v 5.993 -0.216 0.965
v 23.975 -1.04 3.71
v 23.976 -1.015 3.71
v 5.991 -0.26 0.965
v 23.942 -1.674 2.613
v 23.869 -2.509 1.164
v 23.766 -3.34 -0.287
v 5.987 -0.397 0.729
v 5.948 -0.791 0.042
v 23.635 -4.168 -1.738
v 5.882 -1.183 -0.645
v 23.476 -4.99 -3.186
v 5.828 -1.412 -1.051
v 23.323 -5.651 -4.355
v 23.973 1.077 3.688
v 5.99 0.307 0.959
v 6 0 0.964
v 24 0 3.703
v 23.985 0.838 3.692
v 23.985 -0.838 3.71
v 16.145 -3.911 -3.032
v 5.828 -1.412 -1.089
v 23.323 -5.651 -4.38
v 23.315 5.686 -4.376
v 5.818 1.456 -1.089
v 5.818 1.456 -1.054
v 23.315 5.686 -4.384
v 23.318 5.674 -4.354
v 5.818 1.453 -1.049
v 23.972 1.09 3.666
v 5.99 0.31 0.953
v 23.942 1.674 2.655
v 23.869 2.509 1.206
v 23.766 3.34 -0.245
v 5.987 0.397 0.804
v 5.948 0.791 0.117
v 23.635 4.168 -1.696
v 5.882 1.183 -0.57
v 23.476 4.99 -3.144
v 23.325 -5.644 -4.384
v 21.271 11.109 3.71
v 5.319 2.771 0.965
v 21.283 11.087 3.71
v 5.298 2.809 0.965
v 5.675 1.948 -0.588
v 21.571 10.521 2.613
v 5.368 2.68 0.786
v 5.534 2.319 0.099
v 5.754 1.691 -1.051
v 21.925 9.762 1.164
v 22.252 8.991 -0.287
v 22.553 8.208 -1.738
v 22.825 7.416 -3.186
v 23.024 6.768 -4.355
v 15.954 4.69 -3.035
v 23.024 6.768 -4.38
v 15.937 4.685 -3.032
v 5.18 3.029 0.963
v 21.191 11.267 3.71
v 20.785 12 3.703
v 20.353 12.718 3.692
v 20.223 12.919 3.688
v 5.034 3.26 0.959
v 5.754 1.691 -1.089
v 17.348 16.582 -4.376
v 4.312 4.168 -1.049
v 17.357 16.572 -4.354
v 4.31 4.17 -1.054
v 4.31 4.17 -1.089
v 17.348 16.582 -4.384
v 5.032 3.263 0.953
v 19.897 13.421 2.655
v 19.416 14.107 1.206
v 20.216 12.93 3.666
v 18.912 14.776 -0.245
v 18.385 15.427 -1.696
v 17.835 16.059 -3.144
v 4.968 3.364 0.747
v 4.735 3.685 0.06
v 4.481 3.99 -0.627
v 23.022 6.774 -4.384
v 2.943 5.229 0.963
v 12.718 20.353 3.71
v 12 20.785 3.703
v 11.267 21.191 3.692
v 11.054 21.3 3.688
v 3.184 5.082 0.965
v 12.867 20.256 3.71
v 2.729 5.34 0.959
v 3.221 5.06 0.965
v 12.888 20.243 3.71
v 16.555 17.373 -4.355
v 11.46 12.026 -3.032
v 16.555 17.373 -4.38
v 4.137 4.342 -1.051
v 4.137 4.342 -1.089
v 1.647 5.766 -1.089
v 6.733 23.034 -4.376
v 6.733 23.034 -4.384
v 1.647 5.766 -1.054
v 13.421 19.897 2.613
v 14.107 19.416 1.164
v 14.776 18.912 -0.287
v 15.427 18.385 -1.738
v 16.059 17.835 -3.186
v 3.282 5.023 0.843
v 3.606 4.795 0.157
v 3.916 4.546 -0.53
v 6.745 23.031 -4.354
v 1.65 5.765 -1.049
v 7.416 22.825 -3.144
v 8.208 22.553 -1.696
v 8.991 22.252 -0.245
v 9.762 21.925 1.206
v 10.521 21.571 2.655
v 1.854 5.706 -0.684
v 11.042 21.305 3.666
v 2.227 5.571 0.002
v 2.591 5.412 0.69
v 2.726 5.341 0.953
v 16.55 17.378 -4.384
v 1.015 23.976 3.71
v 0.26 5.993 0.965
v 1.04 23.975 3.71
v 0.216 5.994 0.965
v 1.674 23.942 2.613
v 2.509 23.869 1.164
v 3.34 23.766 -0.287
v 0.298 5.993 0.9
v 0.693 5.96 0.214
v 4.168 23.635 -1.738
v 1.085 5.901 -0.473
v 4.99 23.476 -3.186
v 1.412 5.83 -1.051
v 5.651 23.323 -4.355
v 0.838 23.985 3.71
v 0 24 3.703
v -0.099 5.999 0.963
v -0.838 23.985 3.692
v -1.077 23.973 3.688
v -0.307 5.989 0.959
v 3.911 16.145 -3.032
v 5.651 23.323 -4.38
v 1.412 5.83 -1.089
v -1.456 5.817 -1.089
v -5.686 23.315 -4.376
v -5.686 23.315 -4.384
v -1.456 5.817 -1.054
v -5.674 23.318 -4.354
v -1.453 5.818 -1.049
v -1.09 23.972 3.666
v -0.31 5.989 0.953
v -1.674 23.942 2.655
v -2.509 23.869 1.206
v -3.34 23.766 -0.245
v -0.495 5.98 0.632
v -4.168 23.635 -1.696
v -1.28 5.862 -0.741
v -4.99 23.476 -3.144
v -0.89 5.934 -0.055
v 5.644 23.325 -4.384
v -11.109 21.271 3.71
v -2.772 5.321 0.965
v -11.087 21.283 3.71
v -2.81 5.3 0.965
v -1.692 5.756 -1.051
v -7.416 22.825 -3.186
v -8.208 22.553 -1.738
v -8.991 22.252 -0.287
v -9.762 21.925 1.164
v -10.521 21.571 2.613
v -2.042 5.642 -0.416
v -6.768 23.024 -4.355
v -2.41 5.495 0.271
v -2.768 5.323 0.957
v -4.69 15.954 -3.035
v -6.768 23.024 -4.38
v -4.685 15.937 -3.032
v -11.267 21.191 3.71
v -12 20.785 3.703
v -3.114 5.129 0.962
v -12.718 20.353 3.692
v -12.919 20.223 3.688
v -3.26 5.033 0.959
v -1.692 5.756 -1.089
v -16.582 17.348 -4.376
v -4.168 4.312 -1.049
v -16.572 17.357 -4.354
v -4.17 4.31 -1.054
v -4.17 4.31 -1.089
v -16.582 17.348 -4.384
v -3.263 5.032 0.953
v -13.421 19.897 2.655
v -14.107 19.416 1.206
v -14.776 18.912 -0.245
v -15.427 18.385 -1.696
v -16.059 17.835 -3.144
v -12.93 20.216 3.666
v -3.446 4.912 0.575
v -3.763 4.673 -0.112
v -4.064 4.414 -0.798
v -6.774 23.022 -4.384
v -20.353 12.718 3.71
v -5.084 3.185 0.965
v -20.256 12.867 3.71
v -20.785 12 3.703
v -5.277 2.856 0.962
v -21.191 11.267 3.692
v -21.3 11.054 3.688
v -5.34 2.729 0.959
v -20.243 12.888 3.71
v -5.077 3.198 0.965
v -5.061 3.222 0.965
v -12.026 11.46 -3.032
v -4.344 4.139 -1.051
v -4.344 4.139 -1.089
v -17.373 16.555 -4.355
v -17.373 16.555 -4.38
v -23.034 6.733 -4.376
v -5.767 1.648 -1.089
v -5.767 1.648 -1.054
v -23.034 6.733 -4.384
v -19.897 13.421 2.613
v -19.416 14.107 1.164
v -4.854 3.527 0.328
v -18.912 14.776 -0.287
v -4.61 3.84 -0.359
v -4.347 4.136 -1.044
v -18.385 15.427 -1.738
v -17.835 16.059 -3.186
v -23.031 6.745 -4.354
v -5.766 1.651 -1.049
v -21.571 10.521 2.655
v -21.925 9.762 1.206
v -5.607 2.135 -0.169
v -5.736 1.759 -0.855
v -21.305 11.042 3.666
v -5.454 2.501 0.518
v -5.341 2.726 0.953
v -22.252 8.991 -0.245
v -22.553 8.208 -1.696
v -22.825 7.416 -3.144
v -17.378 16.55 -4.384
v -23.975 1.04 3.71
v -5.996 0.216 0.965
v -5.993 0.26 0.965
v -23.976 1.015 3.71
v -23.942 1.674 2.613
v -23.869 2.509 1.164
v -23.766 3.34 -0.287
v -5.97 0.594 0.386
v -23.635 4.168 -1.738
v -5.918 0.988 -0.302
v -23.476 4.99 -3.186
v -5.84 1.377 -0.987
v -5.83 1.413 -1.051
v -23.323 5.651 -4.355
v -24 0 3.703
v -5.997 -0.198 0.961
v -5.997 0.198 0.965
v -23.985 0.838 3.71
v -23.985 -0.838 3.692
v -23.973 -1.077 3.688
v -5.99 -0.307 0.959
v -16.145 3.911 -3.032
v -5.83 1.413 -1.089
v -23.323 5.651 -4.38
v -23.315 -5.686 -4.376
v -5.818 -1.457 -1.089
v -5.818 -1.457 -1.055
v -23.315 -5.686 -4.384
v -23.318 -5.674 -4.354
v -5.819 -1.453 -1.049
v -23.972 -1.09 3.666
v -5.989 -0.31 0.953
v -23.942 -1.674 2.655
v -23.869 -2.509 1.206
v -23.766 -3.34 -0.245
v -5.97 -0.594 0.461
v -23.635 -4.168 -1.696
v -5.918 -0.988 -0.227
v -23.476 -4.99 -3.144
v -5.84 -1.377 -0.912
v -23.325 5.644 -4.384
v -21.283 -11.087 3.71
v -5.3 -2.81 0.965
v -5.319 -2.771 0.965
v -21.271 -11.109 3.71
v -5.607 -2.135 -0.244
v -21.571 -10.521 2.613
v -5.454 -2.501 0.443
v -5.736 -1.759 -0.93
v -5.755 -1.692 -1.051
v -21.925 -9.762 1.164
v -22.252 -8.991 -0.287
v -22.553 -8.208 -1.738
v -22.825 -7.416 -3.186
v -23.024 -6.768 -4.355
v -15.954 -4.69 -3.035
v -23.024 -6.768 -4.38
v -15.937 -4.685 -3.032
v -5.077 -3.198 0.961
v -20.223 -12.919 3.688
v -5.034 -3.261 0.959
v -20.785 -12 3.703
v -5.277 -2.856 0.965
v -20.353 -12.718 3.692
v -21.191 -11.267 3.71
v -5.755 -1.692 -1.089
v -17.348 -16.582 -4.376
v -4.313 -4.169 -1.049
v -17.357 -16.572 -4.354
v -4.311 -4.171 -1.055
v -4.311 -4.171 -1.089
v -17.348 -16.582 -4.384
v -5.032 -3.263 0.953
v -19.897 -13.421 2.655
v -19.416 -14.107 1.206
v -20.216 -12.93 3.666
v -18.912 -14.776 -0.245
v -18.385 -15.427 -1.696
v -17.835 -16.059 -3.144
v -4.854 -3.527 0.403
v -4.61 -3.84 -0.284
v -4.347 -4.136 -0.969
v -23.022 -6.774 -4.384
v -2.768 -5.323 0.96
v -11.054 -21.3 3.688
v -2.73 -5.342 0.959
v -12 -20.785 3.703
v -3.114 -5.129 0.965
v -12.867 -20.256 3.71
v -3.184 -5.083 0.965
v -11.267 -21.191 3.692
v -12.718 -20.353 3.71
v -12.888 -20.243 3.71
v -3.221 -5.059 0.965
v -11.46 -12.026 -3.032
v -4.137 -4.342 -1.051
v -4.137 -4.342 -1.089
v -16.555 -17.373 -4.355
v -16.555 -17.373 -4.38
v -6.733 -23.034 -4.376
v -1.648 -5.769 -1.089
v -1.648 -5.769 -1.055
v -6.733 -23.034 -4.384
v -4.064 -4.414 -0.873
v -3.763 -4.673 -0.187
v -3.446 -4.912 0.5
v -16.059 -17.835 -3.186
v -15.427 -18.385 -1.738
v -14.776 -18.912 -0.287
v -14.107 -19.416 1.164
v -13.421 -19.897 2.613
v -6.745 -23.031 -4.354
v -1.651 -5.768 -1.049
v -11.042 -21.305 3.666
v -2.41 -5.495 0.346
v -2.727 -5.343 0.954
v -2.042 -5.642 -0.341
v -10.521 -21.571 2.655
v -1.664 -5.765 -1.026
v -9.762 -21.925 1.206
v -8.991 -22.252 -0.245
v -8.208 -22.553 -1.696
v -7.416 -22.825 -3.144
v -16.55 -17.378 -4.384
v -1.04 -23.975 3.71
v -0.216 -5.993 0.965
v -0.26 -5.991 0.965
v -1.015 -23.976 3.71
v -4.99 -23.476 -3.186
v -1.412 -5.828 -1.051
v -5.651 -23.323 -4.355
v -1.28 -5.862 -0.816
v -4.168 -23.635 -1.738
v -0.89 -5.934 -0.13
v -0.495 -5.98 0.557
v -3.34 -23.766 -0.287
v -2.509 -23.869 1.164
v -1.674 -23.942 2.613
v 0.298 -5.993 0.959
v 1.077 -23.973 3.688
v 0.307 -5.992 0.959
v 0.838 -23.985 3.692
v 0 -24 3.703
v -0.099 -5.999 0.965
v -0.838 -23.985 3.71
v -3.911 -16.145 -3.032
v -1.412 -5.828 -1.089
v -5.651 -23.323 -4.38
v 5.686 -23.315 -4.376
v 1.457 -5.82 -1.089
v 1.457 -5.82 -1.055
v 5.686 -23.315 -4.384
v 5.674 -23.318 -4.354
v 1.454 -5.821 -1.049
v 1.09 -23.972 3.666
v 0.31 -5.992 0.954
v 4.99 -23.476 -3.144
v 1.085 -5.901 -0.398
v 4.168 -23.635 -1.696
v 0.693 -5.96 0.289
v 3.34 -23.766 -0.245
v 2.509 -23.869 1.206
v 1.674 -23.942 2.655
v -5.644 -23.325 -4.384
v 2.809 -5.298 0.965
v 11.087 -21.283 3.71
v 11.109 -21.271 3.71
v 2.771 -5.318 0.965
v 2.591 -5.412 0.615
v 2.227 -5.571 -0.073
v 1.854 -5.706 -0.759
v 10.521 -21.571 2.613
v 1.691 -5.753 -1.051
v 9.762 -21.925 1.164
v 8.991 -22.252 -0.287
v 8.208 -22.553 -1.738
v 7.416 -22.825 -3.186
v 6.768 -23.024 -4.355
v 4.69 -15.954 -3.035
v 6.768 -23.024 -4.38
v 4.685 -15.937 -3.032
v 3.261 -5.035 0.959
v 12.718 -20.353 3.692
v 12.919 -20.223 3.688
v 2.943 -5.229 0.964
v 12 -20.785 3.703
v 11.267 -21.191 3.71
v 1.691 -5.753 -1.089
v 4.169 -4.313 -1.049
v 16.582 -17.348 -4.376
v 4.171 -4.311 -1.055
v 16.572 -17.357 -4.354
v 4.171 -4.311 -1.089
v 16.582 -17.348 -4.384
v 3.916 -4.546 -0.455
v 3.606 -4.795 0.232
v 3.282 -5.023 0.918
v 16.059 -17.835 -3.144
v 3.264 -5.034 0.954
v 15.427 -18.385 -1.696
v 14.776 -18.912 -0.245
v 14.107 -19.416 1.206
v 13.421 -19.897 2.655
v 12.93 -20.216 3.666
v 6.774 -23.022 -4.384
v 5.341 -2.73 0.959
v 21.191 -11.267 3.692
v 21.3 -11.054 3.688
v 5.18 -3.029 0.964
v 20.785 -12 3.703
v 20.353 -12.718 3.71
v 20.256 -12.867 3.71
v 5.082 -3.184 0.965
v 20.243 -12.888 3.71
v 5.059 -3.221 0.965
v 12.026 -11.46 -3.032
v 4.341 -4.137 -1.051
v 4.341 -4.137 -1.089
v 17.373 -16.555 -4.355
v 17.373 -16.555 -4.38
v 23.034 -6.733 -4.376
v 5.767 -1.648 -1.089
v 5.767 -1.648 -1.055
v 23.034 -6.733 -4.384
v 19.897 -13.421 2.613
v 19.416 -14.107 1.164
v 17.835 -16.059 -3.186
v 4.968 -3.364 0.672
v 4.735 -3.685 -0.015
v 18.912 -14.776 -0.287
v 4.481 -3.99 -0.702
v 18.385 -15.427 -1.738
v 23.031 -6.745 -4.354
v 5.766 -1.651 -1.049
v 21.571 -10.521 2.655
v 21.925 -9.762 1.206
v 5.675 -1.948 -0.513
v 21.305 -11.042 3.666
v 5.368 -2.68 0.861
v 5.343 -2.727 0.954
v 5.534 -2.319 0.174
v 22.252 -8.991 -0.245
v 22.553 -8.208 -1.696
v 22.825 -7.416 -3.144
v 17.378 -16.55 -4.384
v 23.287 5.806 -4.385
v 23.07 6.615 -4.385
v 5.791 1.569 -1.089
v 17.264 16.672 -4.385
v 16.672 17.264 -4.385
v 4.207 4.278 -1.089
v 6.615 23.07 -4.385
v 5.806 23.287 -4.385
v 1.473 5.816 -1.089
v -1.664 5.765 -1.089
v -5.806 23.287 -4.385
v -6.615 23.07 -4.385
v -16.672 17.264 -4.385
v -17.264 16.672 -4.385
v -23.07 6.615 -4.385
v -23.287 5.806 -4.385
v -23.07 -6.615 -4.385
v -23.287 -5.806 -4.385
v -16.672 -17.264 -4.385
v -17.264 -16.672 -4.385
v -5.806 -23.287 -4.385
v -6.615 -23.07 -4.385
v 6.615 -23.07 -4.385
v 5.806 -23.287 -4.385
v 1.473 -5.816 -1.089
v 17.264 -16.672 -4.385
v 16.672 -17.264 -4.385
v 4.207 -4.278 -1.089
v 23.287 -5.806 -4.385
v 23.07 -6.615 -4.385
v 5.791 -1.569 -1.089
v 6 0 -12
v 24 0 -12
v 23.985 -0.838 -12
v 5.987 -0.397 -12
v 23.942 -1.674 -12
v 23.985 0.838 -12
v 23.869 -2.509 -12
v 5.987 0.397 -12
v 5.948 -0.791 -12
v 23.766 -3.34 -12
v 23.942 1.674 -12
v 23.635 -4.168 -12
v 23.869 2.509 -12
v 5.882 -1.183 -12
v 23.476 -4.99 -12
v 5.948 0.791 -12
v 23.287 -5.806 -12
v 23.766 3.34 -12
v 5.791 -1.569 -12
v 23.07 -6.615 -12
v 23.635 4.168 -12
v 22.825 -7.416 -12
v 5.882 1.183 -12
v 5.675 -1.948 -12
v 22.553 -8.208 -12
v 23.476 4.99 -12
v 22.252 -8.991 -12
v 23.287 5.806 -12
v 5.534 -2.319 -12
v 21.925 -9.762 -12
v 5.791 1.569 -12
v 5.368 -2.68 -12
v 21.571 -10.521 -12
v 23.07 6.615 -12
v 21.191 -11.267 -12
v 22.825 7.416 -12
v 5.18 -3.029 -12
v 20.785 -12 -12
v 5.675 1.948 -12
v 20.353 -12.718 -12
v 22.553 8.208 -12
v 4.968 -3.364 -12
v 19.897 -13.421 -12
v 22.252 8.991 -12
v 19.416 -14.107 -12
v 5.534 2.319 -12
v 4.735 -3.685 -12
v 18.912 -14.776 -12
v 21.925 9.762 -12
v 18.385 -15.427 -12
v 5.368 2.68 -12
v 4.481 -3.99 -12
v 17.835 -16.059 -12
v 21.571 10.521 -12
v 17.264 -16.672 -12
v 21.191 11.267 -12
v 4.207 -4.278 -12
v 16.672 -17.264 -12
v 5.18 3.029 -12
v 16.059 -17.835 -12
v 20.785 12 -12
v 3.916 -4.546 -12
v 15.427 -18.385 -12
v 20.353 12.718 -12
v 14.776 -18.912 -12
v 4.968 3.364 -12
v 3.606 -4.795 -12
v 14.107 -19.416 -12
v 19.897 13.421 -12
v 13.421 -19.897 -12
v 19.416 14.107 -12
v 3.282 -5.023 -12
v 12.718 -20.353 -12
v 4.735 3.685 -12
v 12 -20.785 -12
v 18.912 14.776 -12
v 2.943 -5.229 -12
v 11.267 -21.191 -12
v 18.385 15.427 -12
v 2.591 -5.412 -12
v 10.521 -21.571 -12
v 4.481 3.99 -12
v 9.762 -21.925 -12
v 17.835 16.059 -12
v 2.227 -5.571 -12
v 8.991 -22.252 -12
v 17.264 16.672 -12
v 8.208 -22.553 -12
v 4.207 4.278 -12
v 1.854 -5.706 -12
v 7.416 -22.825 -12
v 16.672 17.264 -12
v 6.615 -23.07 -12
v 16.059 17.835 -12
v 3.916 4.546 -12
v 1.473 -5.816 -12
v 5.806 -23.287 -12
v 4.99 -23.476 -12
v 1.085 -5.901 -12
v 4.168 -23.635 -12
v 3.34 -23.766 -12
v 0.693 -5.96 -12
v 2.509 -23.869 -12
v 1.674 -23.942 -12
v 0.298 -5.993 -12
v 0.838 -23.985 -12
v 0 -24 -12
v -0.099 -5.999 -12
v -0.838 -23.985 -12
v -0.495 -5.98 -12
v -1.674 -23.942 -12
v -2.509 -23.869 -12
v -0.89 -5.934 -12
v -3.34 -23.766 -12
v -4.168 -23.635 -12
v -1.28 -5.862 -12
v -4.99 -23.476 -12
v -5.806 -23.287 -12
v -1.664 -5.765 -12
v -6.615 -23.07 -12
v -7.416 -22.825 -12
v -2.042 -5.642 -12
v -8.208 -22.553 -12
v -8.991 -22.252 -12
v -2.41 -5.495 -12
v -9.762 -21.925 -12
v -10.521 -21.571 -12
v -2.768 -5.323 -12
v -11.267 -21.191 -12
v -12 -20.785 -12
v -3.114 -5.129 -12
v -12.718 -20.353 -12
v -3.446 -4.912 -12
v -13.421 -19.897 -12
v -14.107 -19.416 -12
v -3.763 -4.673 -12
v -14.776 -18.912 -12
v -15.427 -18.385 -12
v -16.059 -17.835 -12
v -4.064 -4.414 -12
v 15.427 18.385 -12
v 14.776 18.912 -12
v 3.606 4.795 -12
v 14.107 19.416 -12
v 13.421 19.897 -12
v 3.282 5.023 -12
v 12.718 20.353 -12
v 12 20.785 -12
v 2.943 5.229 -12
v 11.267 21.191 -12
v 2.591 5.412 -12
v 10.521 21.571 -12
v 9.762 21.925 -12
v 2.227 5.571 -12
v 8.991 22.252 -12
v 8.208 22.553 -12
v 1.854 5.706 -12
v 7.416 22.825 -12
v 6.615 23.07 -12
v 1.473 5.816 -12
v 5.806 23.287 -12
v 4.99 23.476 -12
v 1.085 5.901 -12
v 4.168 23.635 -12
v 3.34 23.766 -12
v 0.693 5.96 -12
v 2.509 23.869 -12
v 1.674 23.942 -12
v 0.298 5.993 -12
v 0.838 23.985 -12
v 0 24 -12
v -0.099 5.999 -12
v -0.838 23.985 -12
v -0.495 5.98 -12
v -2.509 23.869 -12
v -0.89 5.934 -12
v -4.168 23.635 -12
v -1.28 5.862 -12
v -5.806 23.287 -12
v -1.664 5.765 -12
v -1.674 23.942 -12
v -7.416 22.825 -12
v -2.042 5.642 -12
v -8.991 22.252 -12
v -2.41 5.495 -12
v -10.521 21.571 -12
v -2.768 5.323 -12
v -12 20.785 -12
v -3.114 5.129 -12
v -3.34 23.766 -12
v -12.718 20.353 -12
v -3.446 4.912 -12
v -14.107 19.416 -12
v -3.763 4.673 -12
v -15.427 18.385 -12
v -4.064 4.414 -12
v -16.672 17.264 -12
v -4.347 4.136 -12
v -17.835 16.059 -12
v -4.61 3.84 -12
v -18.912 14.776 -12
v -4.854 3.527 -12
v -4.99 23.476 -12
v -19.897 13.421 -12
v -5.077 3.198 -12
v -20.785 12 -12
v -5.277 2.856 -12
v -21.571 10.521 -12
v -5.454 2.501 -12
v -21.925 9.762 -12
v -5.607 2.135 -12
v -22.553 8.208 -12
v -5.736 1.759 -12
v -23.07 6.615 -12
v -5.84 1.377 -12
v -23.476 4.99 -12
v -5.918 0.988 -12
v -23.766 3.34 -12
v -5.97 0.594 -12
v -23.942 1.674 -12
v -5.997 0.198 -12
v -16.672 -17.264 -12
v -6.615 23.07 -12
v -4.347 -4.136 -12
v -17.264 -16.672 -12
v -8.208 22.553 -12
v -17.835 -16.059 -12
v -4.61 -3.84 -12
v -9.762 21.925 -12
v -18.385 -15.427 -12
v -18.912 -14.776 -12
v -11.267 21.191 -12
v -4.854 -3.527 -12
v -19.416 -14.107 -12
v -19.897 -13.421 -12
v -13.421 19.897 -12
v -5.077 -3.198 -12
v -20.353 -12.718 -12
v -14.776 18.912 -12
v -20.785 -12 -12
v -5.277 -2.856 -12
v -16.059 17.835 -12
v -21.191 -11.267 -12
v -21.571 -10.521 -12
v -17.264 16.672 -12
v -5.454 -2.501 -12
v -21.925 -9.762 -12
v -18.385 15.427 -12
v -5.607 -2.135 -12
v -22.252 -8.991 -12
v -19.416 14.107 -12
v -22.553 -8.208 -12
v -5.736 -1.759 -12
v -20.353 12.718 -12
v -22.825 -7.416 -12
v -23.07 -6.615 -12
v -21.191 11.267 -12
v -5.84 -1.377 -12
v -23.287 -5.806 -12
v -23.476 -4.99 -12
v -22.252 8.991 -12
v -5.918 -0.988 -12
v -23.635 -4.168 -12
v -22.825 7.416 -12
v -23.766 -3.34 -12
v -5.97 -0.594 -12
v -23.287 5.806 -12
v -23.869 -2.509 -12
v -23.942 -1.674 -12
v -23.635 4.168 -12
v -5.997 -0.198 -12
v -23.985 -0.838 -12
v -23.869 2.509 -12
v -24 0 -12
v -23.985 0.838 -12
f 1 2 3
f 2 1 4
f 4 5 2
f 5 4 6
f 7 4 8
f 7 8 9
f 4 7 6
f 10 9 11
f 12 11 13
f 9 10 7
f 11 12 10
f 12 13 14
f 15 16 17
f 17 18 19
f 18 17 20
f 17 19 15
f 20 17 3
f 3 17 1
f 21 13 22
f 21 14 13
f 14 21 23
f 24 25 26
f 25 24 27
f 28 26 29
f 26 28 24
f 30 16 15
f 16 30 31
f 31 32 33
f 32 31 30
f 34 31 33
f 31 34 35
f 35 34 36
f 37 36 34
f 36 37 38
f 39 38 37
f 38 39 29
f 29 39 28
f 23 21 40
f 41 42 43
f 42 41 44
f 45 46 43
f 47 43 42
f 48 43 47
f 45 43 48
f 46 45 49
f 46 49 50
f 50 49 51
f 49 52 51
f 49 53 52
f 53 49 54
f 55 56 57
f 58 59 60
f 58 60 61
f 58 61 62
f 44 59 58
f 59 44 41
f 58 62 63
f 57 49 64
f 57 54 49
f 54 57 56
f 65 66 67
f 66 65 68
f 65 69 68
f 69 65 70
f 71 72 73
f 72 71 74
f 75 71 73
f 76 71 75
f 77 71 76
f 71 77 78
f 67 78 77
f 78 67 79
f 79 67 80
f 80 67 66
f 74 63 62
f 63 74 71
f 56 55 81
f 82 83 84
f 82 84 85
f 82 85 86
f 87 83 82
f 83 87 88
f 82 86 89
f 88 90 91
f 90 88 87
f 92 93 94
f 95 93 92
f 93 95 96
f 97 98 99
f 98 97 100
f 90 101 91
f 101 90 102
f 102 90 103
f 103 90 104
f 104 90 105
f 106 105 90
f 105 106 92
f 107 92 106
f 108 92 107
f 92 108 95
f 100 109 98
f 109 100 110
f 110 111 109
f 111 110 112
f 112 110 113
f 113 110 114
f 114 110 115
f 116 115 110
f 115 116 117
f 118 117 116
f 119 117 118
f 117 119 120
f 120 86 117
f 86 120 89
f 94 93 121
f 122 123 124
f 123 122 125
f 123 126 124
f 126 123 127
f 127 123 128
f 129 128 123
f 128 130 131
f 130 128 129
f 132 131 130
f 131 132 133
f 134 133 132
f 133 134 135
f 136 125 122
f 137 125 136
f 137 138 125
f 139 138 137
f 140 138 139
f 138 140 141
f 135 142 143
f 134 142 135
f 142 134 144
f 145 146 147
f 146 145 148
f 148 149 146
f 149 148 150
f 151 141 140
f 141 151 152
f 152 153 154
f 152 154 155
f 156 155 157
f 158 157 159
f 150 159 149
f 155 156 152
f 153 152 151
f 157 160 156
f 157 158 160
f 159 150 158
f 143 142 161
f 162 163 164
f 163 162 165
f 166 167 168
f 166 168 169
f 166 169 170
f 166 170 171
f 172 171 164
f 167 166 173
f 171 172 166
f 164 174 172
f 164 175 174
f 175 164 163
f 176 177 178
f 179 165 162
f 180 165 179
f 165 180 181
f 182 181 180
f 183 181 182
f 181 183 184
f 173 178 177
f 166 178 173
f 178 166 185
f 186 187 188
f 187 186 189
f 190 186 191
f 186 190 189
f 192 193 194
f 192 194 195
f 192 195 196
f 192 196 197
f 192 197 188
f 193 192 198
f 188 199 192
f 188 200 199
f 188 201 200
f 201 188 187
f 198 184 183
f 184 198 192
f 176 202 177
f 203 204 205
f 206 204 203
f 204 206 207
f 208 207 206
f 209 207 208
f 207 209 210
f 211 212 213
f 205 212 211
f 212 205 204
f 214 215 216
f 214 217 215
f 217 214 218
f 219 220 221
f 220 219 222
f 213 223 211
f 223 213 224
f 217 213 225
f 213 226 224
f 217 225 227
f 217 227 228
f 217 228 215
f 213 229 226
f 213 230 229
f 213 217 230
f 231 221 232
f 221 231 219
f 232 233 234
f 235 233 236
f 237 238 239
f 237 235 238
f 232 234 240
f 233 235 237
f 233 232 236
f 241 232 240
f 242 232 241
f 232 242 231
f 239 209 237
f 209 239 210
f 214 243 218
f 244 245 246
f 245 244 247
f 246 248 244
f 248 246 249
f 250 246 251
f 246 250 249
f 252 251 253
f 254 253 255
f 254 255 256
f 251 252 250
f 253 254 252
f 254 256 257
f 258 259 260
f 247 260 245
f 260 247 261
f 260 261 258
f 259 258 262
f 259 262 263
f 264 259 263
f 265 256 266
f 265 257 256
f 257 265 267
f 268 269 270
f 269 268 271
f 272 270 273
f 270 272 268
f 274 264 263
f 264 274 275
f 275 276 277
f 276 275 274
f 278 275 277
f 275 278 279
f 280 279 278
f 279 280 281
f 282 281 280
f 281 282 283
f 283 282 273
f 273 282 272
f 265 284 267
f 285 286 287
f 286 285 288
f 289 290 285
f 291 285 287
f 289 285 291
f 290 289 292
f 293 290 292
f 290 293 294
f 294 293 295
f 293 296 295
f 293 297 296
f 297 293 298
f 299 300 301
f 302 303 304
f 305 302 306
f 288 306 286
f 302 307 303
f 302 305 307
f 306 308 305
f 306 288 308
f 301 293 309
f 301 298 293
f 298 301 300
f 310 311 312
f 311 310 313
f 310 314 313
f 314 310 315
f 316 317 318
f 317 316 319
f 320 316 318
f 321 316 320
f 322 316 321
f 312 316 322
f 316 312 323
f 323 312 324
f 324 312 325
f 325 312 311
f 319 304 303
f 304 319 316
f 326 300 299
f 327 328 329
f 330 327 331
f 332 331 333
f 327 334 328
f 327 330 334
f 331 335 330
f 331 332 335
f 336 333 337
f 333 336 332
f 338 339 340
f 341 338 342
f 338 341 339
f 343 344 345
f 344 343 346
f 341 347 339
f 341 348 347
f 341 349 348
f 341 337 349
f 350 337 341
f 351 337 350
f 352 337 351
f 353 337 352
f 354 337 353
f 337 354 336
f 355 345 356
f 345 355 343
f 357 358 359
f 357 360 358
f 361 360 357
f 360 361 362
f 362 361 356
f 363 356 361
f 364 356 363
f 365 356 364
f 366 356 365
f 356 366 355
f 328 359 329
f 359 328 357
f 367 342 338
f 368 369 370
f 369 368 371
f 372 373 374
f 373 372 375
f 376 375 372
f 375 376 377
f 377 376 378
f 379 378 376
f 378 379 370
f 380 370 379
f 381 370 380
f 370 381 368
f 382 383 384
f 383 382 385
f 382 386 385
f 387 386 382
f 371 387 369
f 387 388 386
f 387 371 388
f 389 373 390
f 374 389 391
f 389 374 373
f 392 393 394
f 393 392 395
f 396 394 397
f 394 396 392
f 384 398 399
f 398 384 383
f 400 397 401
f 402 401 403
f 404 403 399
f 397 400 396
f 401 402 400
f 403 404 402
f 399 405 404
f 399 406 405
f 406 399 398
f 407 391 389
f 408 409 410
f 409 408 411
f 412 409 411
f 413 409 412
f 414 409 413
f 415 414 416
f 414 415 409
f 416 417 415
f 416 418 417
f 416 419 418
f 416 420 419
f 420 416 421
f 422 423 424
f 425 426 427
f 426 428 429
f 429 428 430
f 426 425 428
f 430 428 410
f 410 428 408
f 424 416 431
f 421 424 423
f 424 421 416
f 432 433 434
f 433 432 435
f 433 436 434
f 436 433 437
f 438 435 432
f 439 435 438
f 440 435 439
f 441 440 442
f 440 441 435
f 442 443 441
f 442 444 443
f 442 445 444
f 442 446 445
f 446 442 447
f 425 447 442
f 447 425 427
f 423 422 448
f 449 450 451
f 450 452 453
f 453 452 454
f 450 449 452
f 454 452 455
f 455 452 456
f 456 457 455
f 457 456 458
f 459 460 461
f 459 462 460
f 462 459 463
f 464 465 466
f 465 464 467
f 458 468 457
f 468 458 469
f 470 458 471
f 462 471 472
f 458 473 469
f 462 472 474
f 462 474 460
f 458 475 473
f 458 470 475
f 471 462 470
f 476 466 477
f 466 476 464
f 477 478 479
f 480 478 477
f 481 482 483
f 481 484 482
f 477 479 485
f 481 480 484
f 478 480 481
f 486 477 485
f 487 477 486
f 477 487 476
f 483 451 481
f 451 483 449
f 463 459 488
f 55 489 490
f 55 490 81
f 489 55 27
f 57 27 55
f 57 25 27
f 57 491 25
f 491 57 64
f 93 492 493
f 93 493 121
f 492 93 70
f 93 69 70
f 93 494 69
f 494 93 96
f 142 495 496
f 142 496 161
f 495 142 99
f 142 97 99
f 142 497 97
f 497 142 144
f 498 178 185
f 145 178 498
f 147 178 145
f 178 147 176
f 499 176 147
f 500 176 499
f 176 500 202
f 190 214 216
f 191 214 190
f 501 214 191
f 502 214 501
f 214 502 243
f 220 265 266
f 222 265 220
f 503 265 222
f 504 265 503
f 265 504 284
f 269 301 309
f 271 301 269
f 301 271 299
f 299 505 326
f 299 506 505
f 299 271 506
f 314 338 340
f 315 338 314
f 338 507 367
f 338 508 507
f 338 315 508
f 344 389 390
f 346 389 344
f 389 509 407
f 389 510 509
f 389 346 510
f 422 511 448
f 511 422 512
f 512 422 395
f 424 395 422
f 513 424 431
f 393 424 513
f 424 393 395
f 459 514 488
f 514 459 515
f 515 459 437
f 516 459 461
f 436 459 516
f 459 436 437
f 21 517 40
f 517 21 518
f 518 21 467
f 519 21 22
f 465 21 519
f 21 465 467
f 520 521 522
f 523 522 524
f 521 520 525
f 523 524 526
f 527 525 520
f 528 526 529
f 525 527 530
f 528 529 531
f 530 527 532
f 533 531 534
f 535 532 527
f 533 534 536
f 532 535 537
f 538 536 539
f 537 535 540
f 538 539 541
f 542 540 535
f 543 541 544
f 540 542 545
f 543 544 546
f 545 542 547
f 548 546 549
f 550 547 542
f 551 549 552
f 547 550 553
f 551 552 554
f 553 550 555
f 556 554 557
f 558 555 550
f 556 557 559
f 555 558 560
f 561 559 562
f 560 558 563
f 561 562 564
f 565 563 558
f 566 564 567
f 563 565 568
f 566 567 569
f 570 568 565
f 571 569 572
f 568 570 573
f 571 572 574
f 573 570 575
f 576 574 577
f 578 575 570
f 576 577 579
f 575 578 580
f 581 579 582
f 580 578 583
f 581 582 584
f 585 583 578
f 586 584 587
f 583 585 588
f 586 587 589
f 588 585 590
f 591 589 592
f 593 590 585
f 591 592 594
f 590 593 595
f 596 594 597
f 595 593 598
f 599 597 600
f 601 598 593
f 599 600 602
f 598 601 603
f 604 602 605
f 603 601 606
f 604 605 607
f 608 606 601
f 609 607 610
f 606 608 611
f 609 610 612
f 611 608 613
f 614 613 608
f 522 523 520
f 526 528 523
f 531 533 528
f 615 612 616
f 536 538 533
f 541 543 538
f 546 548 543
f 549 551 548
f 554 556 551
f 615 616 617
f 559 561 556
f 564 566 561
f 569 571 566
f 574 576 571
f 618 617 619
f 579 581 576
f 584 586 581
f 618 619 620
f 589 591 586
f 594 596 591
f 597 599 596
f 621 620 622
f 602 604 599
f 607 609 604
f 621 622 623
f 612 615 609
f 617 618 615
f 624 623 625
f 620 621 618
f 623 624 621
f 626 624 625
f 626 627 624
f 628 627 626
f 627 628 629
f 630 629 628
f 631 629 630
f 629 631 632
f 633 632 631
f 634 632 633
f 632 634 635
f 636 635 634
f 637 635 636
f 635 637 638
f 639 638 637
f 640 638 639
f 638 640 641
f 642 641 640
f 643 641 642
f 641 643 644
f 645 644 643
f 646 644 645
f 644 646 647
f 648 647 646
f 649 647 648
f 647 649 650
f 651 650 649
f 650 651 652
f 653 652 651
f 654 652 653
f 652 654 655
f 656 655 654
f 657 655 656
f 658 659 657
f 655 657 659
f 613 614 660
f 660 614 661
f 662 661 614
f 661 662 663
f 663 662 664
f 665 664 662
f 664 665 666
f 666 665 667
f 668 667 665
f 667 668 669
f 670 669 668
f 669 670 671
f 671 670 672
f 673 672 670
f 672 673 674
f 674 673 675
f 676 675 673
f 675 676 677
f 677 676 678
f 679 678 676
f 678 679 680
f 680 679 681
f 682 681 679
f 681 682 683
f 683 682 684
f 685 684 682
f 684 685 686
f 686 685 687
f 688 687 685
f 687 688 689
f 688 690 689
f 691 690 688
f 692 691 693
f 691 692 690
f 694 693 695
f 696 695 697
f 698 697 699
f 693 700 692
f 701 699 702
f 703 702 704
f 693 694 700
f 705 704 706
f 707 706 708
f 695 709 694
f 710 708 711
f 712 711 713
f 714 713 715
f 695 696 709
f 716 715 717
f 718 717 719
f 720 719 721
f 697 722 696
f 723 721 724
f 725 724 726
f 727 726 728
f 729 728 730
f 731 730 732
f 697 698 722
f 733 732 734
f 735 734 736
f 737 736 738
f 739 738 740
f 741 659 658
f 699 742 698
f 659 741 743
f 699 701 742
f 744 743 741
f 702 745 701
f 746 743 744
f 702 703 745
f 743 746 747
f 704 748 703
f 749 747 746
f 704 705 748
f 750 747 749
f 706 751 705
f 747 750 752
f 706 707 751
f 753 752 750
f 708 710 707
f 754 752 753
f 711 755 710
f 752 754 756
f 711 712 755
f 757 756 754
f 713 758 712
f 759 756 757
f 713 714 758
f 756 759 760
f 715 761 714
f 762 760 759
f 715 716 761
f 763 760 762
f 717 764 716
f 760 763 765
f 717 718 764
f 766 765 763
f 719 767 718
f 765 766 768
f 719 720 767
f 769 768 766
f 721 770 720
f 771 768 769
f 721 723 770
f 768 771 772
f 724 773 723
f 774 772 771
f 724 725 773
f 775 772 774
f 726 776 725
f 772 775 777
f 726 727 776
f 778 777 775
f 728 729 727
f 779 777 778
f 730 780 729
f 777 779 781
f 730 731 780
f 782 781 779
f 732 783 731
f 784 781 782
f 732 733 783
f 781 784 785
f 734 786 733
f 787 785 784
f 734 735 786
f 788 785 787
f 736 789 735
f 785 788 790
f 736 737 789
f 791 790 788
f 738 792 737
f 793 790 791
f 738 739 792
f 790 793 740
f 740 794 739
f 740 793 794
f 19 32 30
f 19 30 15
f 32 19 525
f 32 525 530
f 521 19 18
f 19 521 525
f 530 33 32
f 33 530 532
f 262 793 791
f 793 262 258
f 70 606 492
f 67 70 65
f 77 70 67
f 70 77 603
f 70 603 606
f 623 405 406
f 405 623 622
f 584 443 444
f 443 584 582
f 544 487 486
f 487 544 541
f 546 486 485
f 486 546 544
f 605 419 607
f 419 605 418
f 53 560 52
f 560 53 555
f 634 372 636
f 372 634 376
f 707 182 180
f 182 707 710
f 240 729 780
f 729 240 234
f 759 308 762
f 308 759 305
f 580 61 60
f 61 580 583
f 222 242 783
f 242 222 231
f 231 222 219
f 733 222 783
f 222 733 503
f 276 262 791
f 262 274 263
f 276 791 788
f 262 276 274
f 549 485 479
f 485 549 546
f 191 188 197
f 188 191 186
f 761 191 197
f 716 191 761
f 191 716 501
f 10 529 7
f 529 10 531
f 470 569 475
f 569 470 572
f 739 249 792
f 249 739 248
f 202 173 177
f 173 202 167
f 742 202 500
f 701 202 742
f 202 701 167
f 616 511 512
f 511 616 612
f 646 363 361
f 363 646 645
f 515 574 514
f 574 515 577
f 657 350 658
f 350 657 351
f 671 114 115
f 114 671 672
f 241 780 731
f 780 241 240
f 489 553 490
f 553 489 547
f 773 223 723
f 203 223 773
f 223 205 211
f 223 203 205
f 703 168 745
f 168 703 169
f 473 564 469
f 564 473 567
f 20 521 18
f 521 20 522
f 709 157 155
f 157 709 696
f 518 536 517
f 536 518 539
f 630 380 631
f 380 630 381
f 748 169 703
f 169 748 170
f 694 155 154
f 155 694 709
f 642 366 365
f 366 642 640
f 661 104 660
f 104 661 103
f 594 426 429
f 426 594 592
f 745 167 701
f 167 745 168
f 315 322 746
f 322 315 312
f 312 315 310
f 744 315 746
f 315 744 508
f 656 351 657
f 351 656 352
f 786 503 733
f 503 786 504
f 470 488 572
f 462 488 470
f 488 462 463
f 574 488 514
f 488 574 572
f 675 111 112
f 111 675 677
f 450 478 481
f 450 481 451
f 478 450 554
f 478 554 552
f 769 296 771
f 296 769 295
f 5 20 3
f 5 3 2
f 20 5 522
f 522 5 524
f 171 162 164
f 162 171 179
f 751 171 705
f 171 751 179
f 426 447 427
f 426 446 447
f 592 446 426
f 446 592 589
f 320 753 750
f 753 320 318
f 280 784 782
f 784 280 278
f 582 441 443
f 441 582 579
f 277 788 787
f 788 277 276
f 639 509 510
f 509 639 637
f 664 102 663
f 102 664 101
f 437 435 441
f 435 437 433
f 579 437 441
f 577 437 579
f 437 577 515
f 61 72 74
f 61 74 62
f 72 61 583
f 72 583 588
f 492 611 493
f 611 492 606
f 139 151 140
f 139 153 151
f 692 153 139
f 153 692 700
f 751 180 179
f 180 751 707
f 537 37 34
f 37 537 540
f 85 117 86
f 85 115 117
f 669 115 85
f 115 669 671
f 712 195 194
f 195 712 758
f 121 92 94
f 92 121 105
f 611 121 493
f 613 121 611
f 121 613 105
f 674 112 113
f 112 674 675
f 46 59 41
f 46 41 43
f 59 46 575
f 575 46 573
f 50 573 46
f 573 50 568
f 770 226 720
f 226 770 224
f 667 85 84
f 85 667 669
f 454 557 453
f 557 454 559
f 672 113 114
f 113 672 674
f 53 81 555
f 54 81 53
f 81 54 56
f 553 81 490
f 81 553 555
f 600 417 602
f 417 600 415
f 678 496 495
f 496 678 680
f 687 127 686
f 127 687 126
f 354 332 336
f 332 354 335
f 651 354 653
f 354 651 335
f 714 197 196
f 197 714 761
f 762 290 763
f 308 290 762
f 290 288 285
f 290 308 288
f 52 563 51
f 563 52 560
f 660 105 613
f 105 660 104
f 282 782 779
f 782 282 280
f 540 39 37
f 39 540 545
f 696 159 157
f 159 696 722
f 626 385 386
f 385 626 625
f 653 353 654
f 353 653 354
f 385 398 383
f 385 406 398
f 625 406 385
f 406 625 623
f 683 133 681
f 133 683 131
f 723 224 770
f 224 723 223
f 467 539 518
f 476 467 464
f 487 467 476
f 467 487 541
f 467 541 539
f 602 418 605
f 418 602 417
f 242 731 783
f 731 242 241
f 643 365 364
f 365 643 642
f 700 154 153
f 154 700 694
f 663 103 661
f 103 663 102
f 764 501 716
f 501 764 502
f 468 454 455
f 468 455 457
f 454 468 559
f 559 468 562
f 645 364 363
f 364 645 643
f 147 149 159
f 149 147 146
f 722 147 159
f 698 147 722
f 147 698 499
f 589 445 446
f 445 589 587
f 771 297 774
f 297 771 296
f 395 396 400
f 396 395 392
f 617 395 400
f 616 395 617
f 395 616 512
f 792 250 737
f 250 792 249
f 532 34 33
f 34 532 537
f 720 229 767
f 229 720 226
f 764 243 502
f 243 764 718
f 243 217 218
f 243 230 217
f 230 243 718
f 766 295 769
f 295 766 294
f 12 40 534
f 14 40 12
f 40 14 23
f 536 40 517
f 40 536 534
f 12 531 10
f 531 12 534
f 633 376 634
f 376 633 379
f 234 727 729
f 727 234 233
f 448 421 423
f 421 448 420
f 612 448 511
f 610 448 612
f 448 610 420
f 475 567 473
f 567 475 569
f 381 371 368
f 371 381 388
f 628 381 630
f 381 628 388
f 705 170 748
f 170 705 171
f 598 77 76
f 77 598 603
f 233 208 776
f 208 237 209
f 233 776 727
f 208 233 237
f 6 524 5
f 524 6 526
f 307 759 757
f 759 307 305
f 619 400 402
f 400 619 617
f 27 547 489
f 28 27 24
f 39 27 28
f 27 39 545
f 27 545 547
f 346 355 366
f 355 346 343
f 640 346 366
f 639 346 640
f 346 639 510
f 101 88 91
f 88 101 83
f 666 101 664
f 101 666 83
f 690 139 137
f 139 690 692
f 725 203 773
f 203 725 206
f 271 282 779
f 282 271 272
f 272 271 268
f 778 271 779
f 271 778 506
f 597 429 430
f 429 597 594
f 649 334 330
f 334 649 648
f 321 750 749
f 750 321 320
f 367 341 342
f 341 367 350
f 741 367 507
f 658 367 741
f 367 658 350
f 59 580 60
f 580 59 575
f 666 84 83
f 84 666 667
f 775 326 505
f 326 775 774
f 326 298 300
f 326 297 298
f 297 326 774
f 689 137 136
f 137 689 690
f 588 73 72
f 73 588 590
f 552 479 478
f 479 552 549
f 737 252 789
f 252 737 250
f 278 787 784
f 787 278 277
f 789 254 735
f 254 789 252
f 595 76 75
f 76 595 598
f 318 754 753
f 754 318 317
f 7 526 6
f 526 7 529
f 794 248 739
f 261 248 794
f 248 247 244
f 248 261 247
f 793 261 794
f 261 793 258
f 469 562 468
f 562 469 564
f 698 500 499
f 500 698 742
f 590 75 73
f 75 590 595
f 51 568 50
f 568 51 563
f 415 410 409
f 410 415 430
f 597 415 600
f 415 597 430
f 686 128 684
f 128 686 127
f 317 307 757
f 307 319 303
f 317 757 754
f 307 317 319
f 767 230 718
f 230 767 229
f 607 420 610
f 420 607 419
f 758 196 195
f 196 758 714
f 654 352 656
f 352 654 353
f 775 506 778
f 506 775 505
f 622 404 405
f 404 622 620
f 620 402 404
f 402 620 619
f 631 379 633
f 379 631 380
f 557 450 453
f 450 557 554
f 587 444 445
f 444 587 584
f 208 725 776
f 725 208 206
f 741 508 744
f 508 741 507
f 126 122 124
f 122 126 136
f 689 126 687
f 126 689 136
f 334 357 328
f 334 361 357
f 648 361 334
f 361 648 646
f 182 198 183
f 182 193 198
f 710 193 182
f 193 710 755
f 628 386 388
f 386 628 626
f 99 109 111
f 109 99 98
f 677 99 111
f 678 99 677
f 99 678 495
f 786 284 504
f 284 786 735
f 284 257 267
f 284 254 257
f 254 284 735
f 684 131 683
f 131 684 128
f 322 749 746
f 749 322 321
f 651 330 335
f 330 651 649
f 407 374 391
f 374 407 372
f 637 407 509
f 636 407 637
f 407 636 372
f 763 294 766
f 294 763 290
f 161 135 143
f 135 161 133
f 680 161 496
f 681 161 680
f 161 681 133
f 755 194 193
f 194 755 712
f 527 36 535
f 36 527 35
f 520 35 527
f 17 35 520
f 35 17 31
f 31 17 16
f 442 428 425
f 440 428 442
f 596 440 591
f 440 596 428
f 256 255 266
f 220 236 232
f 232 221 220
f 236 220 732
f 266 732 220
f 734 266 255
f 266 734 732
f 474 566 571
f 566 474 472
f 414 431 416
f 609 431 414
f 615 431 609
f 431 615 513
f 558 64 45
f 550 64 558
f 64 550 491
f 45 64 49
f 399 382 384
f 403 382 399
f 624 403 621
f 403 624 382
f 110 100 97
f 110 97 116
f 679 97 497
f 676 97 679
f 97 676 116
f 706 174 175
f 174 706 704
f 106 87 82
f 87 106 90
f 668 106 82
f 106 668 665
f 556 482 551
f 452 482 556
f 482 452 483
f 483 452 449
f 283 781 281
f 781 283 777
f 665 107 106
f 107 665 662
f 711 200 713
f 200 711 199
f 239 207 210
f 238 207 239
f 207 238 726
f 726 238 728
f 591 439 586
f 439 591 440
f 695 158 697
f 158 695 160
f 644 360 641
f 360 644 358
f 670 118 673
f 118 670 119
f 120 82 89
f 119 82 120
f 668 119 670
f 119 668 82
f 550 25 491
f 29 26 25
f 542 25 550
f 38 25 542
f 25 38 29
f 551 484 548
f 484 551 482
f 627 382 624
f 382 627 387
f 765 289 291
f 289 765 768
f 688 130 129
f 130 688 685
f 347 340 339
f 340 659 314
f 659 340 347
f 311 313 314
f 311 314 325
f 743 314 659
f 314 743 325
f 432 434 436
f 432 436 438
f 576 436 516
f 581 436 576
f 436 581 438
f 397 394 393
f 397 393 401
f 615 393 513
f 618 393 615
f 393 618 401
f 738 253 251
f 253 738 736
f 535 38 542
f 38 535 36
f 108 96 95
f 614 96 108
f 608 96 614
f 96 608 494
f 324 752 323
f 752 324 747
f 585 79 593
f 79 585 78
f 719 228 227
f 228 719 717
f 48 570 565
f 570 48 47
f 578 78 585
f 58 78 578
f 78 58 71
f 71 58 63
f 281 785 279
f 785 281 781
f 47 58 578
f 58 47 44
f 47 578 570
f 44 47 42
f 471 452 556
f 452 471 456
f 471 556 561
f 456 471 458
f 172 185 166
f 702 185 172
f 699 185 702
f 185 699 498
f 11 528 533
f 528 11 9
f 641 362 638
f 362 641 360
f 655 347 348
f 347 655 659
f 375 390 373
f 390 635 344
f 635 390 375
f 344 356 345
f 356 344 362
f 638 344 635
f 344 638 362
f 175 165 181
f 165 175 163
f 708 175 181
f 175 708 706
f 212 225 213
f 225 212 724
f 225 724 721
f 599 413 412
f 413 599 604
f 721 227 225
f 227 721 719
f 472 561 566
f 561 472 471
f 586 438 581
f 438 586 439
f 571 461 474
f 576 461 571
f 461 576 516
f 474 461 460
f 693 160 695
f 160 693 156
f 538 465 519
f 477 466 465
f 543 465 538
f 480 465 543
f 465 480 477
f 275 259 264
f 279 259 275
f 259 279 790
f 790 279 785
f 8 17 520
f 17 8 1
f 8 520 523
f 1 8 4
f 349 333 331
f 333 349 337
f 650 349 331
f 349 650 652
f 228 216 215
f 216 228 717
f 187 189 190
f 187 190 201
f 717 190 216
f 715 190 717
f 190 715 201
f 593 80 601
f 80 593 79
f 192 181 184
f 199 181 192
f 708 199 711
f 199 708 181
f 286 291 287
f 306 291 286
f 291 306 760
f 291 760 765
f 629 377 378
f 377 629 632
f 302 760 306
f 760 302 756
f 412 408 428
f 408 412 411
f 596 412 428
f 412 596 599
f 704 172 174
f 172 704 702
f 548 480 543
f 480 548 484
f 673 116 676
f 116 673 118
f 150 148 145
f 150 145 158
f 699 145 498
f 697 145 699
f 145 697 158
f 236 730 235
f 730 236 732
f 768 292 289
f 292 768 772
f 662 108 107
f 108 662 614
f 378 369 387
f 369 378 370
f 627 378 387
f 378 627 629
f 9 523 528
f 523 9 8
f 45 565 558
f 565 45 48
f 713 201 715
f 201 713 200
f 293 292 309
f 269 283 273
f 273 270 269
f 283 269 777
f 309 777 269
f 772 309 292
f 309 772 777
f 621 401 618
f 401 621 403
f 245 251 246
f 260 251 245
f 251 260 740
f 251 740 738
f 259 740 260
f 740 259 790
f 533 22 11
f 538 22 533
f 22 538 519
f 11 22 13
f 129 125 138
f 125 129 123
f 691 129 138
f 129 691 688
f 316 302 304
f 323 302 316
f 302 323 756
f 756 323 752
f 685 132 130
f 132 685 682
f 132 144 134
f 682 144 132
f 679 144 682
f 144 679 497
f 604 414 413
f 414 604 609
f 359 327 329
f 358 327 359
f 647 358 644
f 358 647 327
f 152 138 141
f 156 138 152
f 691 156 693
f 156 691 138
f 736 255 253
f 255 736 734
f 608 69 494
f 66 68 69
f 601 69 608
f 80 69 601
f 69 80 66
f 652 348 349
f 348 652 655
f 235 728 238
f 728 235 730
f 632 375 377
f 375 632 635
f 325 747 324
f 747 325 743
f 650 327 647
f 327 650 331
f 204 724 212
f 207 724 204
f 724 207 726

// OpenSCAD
/*
Author: Lukas M. Süss aka mechadense
License: LGPL-3.0
Description: A minimal function for generation of hirth joints.

This is more meant as a library.
Deliberately kept minimal.

Customizer is just meant as a quick preview of what can be done.
Note that there is no math for sanity checking of supplied parameters.

## Usage tipps:

```
use <lib-hirthjoints.scad>
hirth
  ( n = 12
  , r = 24
  , zbase = 8
  , slant = 60 
  , a1up = 10
  , a1down = 12
  , cuttype = "cylindrical"
  , dbore = 12
  , acone = 0
  )
```

- Always keep down_angle bigger than up_angle or the roofs will hit the valleys.
- If you use ist as a cutter then increase r and decrease dbore compared to the counterpart such that the teeth will fit radially.
- For printing a hirth interface at the bottom of a FFF-3D-print one can avert the need for support material by cutting off half of the teeth. This still meshes with full teeth but not with cutoff teeth.

## Notes:

This is the third and so far most performant attempt.
It uses convex hulls to span volumes.

I found that the crux for hirth joints is to 
***operate in spherical rather than in cylindrical coordinates***

## History of preceding attempts:

Elegant but inefficient & buggy (attempt two):
Intersections of approximated halfspaces
https://www.thingiverse.com/thing:397553

Earliest (attempt one):
Vertices and meshing:
https://www.thingiverse.com/thing:387292
*/


// TODO:  add more vertical height in demos
// Publish on thingiverse and github
// import into bearing model and continue



// ##################################
// ##################################
// https://customizer.makerbot.com/docs
// Customizer

/* [Global] */

// number of hirth teeth (>=2)
toot_number = 12;
// radius … use a bit bigger radius for cutters
r0 = 24;
// vertical distance from hirths center-point to bottom of support
z_base =12;
// slant angle of the hirth teeth
slant_angle = 60;
// rotation angle upwards (roughly correspods to tooth height)
up_angle = 10;
// rotation angle downwards (roughly correspods to tooth depth)
down_angle = 12;
// spherical is most natural choice but slowest
type_of_cutoff = "cylindrical"; //["cylindrical","spherical","none"]
// hole diameter (0 means no more)
hole_diameter = 12;
// if not 0 then the complementariy interface needs the same cone angle but negative 
cone_angle = 0;

/* [Hidden] */

//Resolution
// minimal angle per "circle edge" 
$fa = 2;
// minimal length per "circle edge"
$fs = 0.4;

// colors
cylcol = [0.9,0.9,0.9];
basecolor = "cyan";


// ##################################


customizer_demo();
//demoarray();

module customizer_demo()
{
hirth
  ( n = toot_number // >=2
  , r = r0 // use a bit bigger r for cutters
  , zbase = z_base // bottom depth of straight cylindrical support
  , slant = slant_angle // tooth slant angle 
  , a1up = up_angle // big circle rotation angle up (~tooth height)
  , a1down = down_angle // big circle rotation angle down (~tooth depth)
  , cuttype = type_of_cutoff // cylindrical,spherical,none
  , dbore = hole_diameter
  , acone = cone_angle
  );
}

// need to debug zbasedemo ...
module demoarray
  (nmax = 12
  ,rdemo = 18
  ,dist = 48 // way bigger for cuttype none
  ,zbasedemo_convex = 32
  ,zbasedemo_flat = 16
  ,zbasedemo_concave = 4
  ,aconedemo = 30
  ,cuttypedemo = "cylindrical"
  ,dboredemo = 12.6
  )
{
for(ndemo=[2:nmax])
  {
  i = ndemo-2;
  translate([0,dist*i,0])
    {
    translate([-1*dist,0,0])
    hirth
      ( n = ndemo
      , r = rdemo
      , zbase = zbasedemo_concave
      , slant = 60
      , a1up = 12 - ndemo/2 // just to get something reasonable
      , a1down = 14  - ndemo/2
      , cuttype = cuttypedemo
      , dbore = dboredemo
      , acone = -aconedemo
      );
    translate([0*dist,0,0])
    hirth
      ( n = ndemo
      , r = rdemo
      , zbase = zbasedemo_flat
      , slant = 60
      , a1up = 12 - ndemo/2 
      , a1down = 14 - ndemo/2
      , cuttype = cuttypedemo
      , dbore = 0
      , acone = 0
      );
    translate([+1*dist,0,0])
    hirth
      ( n = ndemo
      , r = rdemo
      , zbase = zbasedemo_convex
      , slant = 60
      , a1up = 12 - ndemo/2 
      , a1down = 14 - ndemo/2
      , cuttype = cuttypedemo
      , dbore = dboredemo
      , acone = +aconedemo
      ); 
    }
  }
}

// #####################################
// #####################################
// #####################################
// #####################################

module hirth
  ( n = 12 // >=2
  , r = 24 // use a bit bigger r for cutters
  , zbase = 8 // bottom depth of straight cylindrical support
  , slant = 60 // tooth slant angle 
  , a1up = 10 // big circle rotation angle up (~tooth height)
  , a1down = 12 // big circle rotation angle down (~tooth depth)
  , cuttype = "cylindrical" // cylindrical,spherical,none
  , dbore = 0 // diameter of center hole
  , acone = 0 // conicality
  , verbose = "false"
  , eps = 0.05
  )
{ 
  
  a2 = slant; // hirth plane tilt angle
  // a2 ideally as high (steep) as possible 
  // without causing parts to remain stuck together
  // after heavy compressive loading
  // if printlayers hooking together just barely sometimes is problemeatic
  // then stay below 70°

  angle = 360/n; // angle per full tooth period 
  a3 = angle/4; // angle per half addendum or dedendum

  // Note: rmax includes some overstand that can be cut off by 
  // choosing a cuttype parameter of "cylindrical" or "spherical"
  // cuttoff overstand factor of 2.0 was choosen to 
  // have no missing part artefacts even with just 2 teeth
  rmax = r*2/cos(acone);
  // the cos(acone) part takes care of a shrinking cylindrical radius for 
  // higher absolute values of acone  
  // making the factor bigger is bad since at some point it
  // overrides the specified baseheight
  

  // TODO -- how to calculate a1 for sharp teeth (no flat at tip)?
  // It may be that this is not analytically solvable ...

  // ###############################################
  // deriving the height of the dedenta of the teeth
  // basically manually multiplying rotation matrices
  // Math derivation. DO NOT REMOVE.
  // after first rotation around z axis
  // rmax * [cos(a1),sin(a1),0] 
  // after second rotation around x axis
  // rmax * [cos(a1), sin(a1), 0]
  // rmax * [cos(a1), sin(a1)*cos(a2)-0*sin(a2),sin(a1)*sin(a2)+0*cos(a2)]
  // rmax * [cos(a1), sin(a1)*cos(a2),sin(a1)*sin(a2)]
  // after third rotation around z axis again
  // rmax * [cos(a1)*cos(a3)-sin(a1)*cos(a2)*sin(a3),
  //         cos(a1)*sin(a3)+sin(a1)*cos(a2)*cos(a3),
  //         sin(a1)*sin(a2)]
  // last line gives z height of where the point finally ends up
  k0down = sin(a1down) * sin(a2);
  z0down = rmax * k0down; // see math derivation above
  a0down = asin(k0down);
  // analogously for the addenda (not checked, not in use)
  k0up = sin(a1up) * sin(a2);
  z0up = rmax * k0up; 
  a0up = asin(k0up);


  // ############## 
  // the following is relevant for:
  // -> permanent tooth suport sttructures
  // -> the conical case (acone>0 || acone<0)
  // final rotations in xy plane (used for conicality only)
  a4up = atan2
    (cos(a1up)*sin(a3)+sin(a1up)*cos(a2)*cos(a3)
    ,cos(a1up)*cos(a3)-sin(a1up)*cos(a2)*sin(a3));
  a4down = atan2
    (cos(a1down)*sin(a3)+sin(a1down)*cos(a2)*cos(a3)
    ,cos(a1down)*cos(a3)-sin(a1down)*cos(a2)*sin(a3));

  // finding z0cone for the conical case (reduced to 2D problem)
  // point is at: [sqrt(rmax^2-z0down^2),z0down]
  // rotating it further by the cone angle:
  // z0cone = [sin(acone),cos(acone)] · [sqrt(rmax^2-z0down^2),z0down] 
  // this gives:
  z0cone = sqrt(rmax*rmax - z0down*z0down) * sin(acone) + z0down * cos(acone);
  // Sanity check: acone==0 => z0cone == z0down FINE
  r0cone = sqrt(rmax*rmax - z0down*z0down) * cos(acone) - z0down * sin(acone);

  // #################### debugging section
  if(verbose) echo(z0cone=z0cone);
  if(verbose) echo(z0down=z0down);
  if(verbose) echo(a3=a3, "quater angle per tooth");
  // DEBUG plane
  //color("grey")translate([0,0,-z0down]) cylinder(r= 100,h=0.05);
  //color("grey")translate([0,0,-z0cone]) cylinder(r= 100,h=0.05);

  difference()
  {
    intersection()
    {
      union()
      {
        for(i=[0:n-1])
        {
          rotate(360/n*i,[0,0,1])
          color("red") hirthtooth(); 
        }
        if(z0cone>=0) // flat and convex case
        {
          // permanent support structure
          support(n);
          // straight cylindrical base
          hbase = zbase-z0cone;
          color(basecolor)
          translate([0,0,-zbase])
            cylinder(r=r0cone,h=hbase,center=false);
          
          // BELOW was a somewhat dangerous hack:
          // conical adapter section
          //scale([1,1,-1])
          //  cylinder(r1=0,r2=r0cone,h=z0cone);
        } 
        else // (z0cone<0) // concave case
        {
          difference()
          {
            // baseblock
            hbase = zbase-z0cone;
            color(basecolor)
            translate([0,0,-zbase])
              cylinder(r=r0cone,h=hbase,center=false);
            // cutting from the baseblock
            translate([0,0,2*eps])  support(n);
            // doesn't this make the construction obsolete? To Check ...
            
            // BELOW was a not working hack:            
            // conical cut
            //scale([1,1,-1])
            //translate([0,0,eps])
            //  cylinder(r1=0,r2=r0cone,h=-z0cone);     
          }
        }
      }
      // cutting it round
      if(cuttype == "spherical") sphere(r=r,$fn=24*4);
      if(cuttype == "cylindrical") 
        color(cylcol) cylinder(r=r,h=42*r,center=true); //**
      if(cuttype == "none") {} // leave the cutting to the lib user
      // hirth couplings work in spherical coordinates so ...
      // a cylinder mathematically less correct than sphere ...
      // but it is computationally less expensive
      // maybe make this optional
    }
    if(dbore!=0) color(cylcol) cylinder(r=dbore/2,h=1000,center=true);
  }
  
  module hirthtooth()
  {
    hull()
    { 
      spanner(); // the center
      
      // ################
      // upper tooth tips

      // make it conical
      rotate(-a4up,[0,0,1])      
      rotate(acone,[0,1,0])      
      rotate(+a4up,[0,0,1])
      //rotate(acone,[0,-1,0]) // < only approx correct for many small teeth
      // basic planar hirth
      rotate(-a3,[0,0,1]) // rotate x-y-plane crossing of big circle
      rotate(+a2,[1,0,0]) // tilt big circle 
      rotate(a1up,[0,0,1]) // big circle rotation angle
        translate([rmax,0,0]) spanner();

      // make it conical
      rotate(+a4up,[0,0,1])      
      rotate(acone,[0,1,0])      
      rotate(-a4up,[0,0,1])      
      // basic planar hirth
      rotate(+a3,[0,0,1]) // rotate x-y-plane crossing of big circle
      rotate(-a2,[1,0,0]) // tilt big circle 
      rotate(-a1up,[0,0,1]) // big circle rotation angle
        translate([rmax,0,0]) spanner();
      
      // #################
      // lower tooth bases

      // make it conical
      rotate(-a4down,[0,0,1])      
      rotate(acone,[0,1,0])      
      rotate(+a4down,[0,0,1])
      // basic planar hirth
      rotate(-a3,[0,0,1]) // rotate x-y-plane crossing of big circle
      rotate(+a2,[1,0,0]) // tilt big circle 
      rotate(-a1down,[0,0,1]) // big circle rotation angle
        translate([rmax,0,0]) spanner();

      // make it conical
      rotate(+a4down,[0,0,1])      
      rotate(acone,[0,1,0])      
      rotate(-a4down,[0,0,1])      
      // basic planar hirth      
      rotate(+a3,[0,0,1]) // rotate x-y-plane crossing of big circle
      rotate(-a2,[1,0,0]) // tilt big circle 
      rotate(+a1down,[0,0,1]) // big circle rotation angle
        translate([rmax,0,0]) spanner();
      
      // READ IN REVERSE:
      // rotate to move flank from tooth center to tooth side
      // rotate that move into the final flank-angle 
      // rotate an angle that will become an angle anong the flank later
      // shift spanner out to spanning radius
      
      // TODO 
      // how to extend this to allow for conical hirth joints
    }    
  }
  
  module support(n)
  {
    for(i=[0:n-1])
    {
      rotate(360/n*i,[0,0,1])
      {
        a4down_complement = ((360/n)-2*a4down)/2; // ISSUE why too wide here ???? 
        // support for tooth (addendum)
        union() // does not seem to help with artefacts
        {
          color("green") support_slice(a4down);
          //spacefiller for gap (dedendum) 
          color("blue")    
            rotate(360/(2*n),[0,0,1])
              support_slice(a4down_complement); // issues here
        }
      }
    }
  }

  module support_slice(a=1)
  {
    scale([1,1,-1])
    hull()
    {
      translate([0     ,0,0     ]) spanner();
      translate([0     ,0,z0cone]) spanner();
      rotate(-a,[0,0,1])
        translate([r0cone,0,z0cone]) spanner();
      rotate(+a,[0,0,1])
        translate([r0cone,0,z0cone]) spanner();
    }
  }

  module spanner() // minor hack
  { 
    cube(eps); // fewer vertices
    //rotate(90,[0,1,0])sphere(r=0.05,$fn=6); 
  }
  
}
